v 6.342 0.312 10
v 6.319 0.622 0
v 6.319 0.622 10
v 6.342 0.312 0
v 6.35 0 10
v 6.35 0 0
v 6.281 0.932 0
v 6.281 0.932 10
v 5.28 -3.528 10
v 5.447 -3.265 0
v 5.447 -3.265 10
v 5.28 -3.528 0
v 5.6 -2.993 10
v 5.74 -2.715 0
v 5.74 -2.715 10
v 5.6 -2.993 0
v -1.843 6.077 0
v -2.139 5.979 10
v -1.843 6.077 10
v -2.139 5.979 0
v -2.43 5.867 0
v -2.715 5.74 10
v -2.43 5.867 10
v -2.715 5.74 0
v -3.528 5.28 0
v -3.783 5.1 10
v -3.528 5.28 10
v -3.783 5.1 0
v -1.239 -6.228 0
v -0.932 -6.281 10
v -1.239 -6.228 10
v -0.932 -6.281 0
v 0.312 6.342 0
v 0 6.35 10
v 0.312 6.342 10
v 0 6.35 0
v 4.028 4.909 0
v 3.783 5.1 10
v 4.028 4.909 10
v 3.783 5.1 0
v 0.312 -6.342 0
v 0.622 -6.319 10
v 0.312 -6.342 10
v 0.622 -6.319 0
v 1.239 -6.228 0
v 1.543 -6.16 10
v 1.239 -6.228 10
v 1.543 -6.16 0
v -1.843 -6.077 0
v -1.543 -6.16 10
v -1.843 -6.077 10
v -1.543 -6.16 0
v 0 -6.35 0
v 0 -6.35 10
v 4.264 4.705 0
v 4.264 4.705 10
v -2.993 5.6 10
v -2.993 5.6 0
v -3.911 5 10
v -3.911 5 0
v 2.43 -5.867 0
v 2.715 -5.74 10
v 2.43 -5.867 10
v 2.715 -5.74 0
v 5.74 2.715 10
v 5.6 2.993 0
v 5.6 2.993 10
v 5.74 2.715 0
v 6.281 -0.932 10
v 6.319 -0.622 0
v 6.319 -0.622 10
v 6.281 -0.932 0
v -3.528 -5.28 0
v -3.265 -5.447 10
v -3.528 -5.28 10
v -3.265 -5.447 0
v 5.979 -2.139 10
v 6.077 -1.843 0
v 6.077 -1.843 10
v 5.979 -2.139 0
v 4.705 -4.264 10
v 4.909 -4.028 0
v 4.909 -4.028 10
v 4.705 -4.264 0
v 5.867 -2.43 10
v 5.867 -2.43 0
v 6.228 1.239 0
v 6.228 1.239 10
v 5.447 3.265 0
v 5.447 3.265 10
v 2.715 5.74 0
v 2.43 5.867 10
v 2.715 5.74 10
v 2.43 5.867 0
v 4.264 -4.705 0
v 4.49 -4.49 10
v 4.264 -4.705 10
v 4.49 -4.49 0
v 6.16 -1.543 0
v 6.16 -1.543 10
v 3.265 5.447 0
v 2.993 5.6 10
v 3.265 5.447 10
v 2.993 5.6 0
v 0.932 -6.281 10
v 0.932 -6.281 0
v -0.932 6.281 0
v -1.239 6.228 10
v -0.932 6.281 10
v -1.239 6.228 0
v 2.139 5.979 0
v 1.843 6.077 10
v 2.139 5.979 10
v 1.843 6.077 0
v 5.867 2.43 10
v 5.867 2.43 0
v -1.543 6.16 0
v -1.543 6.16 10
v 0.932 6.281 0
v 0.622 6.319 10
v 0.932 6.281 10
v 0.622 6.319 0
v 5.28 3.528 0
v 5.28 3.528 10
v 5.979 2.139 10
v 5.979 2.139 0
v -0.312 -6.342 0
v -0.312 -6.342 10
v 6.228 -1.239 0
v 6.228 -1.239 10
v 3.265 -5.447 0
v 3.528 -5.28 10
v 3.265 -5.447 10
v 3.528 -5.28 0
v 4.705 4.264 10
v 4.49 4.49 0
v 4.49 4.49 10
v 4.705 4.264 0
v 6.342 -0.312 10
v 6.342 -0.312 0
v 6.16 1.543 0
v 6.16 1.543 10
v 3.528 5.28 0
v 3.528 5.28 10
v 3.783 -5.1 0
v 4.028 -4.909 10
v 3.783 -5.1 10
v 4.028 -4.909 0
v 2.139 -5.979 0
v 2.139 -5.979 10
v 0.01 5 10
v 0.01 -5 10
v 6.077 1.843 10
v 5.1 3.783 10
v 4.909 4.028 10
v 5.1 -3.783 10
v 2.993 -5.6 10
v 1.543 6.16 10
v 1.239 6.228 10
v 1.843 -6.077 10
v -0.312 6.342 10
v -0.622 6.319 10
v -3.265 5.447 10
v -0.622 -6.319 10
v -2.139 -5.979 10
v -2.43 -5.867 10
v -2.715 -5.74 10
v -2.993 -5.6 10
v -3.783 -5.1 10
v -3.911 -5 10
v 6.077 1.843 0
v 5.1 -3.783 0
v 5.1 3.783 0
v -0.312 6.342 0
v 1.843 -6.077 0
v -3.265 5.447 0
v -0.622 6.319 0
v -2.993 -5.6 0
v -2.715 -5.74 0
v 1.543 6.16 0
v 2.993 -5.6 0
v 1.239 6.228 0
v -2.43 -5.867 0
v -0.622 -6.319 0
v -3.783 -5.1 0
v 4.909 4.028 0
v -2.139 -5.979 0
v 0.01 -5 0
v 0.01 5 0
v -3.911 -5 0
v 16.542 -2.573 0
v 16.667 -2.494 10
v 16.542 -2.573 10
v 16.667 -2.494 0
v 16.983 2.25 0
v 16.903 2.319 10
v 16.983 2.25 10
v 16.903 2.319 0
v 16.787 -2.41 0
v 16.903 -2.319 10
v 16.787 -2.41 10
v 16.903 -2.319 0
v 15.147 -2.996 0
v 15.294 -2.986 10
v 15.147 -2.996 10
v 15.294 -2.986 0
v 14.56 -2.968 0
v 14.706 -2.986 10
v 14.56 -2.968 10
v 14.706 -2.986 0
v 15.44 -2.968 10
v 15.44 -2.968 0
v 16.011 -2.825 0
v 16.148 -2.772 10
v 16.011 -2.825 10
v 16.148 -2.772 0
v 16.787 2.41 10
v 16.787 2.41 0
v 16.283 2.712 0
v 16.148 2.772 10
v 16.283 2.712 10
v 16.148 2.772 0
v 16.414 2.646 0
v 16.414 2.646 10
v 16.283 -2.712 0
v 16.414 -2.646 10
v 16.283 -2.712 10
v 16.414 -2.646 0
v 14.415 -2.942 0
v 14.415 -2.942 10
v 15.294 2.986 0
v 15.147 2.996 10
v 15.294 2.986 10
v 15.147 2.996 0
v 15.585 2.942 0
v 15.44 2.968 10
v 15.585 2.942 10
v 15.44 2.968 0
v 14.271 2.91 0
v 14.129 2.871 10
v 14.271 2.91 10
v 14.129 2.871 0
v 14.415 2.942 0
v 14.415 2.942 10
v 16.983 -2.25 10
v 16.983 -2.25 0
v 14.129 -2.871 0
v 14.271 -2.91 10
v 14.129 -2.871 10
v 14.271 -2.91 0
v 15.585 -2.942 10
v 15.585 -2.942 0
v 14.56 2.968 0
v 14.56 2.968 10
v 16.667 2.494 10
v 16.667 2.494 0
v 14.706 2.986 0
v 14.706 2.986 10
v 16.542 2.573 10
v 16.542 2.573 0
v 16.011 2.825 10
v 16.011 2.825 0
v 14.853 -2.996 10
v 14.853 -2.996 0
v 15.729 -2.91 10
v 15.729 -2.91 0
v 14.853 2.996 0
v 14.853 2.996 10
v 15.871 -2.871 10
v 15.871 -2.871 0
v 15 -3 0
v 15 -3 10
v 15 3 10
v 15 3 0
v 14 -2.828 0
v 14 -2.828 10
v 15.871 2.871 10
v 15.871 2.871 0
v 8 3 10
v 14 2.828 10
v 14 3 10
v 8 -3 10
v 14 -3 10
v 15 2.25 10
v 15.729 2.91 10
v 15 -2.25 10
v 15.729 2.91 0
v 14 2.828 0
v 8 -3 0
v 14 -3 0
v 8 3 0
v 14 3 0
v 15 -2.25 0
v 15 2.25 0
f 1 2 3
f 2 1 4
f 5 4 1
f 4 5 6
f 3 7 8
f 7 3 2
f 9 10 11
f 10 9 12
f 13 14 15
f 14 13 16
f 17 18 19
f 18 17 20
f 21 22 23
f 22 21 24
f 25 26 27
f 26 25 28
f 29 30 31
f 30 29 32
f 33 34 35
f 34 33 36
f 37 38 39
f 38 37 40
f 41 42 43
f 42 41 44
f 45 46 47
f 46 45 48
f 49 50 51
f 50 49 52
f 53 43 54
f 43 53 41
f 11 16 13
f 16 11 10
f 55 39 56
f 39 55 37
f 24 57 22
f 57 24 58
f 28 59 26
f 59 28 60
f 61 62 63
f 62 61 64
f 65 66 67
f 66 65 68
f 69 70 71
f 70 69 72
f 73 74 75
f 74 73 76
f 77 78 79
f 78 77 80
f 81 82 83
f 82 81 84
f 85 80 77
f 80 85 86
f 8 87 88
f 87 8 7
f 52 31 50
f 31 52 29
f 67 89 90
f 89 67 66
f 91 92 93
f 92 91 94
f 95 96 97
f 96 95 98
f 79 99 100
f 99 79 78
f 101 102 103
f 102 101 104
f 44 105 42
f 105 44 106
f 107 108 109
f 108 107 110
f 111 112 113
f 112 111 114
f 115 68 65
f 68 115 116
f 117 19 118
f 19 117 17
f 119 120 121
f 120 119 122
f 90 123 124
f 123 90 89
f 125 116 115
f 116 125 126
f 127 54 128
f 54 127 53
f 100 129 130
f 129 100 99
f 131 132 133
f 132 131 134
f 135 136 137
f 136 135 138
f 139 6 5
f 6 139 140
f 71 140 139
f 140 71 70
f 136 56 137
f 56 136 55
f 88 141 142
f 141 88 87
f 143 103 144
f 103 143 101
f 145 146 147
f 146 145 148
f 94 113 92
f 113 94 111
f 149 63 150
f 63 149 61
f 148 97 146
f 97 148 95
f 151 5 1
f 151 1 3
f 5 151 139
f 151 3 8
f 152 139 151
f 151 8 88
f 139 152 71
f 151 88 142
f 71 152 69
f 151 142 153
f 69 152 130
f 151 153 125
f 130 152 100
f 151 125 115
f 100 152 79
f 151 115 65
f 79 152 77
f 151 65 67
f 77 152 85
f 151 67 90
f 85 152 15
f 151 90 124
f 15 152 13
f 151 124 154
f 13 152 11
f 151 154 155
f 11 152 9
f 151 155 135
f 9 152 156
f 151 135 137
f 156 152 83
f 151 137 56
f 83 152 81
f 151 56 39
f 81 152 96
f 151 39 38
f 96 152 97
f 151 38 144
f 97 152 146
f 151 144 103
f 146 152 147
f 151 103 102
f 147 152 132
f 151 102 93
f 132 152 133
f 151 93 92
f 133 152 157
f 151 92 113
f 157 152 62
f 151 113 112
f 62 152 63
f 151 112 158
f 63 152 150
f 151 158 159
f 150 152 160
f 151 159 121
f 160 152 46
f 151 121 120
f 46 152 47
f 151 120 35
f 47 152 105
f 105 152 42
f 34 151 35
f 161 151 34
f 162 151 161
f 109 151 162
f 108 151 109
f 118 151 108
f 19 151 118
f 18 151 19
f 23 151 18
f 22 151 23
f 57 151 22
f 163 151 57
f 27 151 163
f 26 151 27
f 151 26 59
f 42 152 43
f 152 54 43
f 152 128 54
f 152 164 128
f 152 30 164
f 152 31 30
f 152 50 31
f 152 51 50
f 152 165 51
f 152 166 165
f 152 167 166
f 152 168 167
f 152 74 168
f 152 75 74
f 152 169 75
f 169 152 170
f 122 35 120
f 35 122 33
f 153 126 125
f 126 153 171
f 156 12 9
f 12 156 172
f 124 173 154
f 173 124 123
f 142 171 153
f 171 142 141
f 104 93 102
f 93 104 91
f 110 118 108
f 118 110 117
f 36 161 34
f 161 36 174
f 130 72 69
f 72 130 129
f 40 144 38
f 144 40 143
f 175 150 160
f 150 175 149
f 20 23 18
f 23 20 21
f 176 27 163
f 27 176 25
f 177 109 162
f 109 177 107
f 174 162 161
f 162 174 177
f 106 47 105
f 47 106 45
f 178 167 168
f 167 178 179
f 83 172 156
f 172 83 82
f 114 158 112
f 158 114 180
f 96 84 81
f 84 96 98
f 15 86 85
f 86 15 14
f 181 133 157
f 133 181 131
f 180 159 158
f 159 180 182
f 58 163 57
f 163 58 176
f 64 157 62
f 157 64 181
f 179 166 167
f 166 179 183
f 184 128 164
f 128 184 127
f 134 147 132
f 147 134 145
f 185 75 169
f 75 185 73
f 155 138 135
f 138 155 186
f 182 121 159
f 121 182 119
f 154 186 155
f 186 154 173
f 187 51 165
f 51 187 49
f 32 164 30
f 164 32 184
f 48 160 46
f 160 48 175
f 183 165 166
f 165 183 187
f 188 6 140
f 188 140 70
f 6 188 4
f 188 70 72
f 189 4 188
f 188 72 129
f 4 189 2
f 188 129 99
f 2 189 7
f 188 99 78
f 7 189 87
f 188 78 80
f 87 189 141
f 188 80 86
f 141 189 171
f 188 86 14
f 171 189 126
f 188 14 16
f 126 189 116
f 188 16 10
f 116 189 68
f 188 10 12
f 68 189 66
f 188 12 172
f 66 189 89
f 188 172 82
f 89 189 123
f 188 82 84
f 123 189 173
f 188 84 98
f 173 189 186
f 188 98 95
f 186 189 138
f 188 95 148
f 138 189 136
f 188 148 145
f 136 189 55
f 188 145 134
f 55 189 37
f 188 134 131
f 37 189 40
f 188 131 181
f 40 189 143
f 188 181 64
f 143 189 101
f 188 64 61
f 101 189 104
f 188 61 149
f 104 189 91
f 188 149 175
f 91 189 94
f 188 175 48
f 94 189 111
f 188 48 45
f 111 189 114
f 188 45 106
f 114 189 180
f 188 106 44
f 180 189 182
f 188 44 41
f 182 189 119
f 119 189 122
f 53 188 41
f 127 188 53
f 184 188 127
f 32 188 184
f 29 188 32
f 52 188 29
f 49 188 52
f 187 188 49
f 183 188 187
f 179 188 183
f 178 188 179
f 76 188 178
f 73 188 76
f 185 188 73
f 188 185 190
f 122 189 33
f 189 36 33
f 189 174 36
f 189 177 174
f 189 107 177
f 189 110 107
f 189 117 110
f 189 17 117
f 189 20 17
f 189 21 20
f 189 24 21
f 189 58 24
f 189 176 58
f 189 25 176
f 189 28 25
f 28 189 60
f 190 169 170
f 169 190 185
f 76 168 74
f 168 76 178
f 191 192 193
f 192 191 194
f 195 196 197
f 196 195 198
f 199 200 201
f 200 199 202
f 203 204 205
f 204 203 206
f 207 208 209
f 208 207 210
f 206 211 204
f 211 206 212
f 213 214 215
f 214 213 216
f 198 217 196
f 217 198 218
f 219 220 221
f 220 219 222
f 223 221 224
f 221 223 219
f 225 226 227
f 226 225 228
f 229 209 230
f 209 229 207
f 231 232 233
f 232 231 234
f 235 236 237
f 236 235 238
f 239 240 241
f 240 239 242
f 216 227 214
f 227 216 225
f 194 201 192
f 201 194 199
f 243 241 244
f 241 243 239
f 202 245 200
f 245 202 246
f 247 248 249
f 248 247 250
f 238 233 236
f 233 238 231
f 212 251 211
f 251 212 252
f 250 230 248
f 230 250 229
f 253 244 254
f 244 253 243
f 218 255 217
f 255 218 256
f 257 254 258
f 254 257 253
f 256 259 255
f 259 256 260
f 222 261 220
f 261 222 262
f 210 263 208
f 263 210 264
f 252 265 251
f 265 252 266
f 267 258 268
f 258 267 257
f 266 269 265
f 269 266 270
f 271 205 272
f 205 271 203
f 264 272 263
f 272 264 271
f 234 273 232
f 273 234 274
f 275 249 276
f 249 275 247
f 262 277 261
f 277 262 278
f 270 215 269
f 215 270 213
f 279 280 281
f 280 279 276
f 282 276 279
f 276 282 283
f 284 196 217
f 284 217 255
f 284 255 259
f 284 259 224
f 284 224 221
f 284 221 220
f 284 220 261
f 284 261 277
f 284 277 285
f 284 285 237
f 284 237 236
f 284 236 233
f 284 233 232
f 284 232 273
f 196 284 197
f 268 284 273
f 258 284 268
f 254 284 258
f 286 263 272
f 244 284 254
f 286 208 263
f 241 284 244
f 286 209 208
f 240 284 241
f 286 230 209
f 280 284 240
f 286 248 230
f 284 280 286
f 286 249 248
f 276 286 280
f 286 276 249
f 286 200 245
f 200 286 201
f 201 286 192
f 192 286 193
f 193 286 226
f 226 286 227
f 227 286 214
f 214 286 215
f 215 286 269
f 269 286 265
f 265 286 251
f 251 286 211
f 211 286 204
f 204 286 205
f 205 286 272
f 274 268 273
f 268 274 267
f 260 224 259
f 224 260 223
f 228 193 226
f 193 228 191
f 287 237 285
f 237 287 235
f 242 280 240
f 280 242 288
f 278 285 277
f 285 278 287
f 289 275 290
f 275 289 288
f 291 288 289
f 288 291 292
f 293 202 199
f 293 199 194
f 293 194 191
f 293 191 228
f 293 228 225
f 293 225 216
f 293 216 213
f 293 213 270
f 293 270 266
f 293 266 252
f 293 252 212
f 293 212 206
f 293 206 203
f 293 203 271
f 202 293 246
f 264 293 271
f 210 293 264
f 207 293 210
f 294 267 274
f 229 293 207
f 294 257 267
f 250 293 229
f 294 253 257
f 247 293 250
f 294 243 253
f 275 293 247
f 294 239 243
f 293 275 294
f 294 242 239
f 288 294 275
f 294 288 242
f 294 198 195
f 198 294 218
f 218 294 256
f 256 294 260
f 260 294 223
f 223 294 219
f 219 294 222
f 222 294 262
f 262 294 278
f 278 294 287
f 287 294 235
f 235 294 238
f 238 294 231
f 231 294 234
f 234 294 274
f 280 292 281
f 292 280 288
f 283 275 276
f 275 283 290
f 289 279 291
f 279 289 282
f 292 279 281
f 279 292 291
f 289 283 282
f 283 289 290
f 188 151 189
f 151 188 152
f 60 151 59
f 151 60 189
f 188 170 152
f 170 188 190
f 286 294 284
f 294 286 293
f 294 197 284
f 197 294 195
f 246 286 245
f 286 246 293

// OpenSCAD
// Snap-on clip: holds a piece of tubing next to a 12.7 mm lab stand rod
// Printed flat: 2-D profile in XY, extruded 10 mm in +Z

$fn = 128;

// ---------------- Parameters ----------------
rod_d      = 12.7;              // rod ring inner diameter
rod_wall   = 3;                 // rod ring wall thickness
rod_r      = rod_d / 2 + rod_wall; // rod ring outer radius (18.7)

tub_d      = 6;                 // tubing ring inner diameter
tub_wall   = 2;                 // tubing ring wall thickness
tub_r      = tub_d / 2 + tub_wall;   // tubing ring outer radius (5)

bridge_w   = 6;                 // bridge width in X (from x = 8 to x = 12)
bridge_y   = 6;                 // bridge width in Y

open_rod   = 10;                // rod ring opening width in Y (-5 < y < 5)
open_tub   = 4.5;               // tubing ring opening width in Y (-2.25 < y < 2.25)

height     = 10;                // extrusion height in Z

eps        = 0.5;               // cutter overshoot past cut faces

// ---------------- Model ----------------
difference() {
    union() {
        // Rod ring
        cylinder(d = rod_d, r = rod_r, h = height);
        // Tubing ring
        translate([15, 0, 0])
            cylinder(d = tub_d, r = tub_r, h = height);
        // Solid bridge between the rings
        translate([8, -bridge_y / 2, 0])
            cube([bridge_w, bridge_y, height]);
    }

    // Rod ring opening on the -X side: x < 0, -5 < y < 5
    translate([-(rod_r + eps), -open_rod / 2, -eps])
        cube([rod_r + eps + 0.01, open_rod, height + 2 * eps]);

    // Tubing ring opening on the +X side: x > 15, -2.25 < y < 2.25
    translate([15, -open_tub / 2, -eps])
        cube([tub_r + eps + 0.01, open_tub, height + 2 * eps]);
}
